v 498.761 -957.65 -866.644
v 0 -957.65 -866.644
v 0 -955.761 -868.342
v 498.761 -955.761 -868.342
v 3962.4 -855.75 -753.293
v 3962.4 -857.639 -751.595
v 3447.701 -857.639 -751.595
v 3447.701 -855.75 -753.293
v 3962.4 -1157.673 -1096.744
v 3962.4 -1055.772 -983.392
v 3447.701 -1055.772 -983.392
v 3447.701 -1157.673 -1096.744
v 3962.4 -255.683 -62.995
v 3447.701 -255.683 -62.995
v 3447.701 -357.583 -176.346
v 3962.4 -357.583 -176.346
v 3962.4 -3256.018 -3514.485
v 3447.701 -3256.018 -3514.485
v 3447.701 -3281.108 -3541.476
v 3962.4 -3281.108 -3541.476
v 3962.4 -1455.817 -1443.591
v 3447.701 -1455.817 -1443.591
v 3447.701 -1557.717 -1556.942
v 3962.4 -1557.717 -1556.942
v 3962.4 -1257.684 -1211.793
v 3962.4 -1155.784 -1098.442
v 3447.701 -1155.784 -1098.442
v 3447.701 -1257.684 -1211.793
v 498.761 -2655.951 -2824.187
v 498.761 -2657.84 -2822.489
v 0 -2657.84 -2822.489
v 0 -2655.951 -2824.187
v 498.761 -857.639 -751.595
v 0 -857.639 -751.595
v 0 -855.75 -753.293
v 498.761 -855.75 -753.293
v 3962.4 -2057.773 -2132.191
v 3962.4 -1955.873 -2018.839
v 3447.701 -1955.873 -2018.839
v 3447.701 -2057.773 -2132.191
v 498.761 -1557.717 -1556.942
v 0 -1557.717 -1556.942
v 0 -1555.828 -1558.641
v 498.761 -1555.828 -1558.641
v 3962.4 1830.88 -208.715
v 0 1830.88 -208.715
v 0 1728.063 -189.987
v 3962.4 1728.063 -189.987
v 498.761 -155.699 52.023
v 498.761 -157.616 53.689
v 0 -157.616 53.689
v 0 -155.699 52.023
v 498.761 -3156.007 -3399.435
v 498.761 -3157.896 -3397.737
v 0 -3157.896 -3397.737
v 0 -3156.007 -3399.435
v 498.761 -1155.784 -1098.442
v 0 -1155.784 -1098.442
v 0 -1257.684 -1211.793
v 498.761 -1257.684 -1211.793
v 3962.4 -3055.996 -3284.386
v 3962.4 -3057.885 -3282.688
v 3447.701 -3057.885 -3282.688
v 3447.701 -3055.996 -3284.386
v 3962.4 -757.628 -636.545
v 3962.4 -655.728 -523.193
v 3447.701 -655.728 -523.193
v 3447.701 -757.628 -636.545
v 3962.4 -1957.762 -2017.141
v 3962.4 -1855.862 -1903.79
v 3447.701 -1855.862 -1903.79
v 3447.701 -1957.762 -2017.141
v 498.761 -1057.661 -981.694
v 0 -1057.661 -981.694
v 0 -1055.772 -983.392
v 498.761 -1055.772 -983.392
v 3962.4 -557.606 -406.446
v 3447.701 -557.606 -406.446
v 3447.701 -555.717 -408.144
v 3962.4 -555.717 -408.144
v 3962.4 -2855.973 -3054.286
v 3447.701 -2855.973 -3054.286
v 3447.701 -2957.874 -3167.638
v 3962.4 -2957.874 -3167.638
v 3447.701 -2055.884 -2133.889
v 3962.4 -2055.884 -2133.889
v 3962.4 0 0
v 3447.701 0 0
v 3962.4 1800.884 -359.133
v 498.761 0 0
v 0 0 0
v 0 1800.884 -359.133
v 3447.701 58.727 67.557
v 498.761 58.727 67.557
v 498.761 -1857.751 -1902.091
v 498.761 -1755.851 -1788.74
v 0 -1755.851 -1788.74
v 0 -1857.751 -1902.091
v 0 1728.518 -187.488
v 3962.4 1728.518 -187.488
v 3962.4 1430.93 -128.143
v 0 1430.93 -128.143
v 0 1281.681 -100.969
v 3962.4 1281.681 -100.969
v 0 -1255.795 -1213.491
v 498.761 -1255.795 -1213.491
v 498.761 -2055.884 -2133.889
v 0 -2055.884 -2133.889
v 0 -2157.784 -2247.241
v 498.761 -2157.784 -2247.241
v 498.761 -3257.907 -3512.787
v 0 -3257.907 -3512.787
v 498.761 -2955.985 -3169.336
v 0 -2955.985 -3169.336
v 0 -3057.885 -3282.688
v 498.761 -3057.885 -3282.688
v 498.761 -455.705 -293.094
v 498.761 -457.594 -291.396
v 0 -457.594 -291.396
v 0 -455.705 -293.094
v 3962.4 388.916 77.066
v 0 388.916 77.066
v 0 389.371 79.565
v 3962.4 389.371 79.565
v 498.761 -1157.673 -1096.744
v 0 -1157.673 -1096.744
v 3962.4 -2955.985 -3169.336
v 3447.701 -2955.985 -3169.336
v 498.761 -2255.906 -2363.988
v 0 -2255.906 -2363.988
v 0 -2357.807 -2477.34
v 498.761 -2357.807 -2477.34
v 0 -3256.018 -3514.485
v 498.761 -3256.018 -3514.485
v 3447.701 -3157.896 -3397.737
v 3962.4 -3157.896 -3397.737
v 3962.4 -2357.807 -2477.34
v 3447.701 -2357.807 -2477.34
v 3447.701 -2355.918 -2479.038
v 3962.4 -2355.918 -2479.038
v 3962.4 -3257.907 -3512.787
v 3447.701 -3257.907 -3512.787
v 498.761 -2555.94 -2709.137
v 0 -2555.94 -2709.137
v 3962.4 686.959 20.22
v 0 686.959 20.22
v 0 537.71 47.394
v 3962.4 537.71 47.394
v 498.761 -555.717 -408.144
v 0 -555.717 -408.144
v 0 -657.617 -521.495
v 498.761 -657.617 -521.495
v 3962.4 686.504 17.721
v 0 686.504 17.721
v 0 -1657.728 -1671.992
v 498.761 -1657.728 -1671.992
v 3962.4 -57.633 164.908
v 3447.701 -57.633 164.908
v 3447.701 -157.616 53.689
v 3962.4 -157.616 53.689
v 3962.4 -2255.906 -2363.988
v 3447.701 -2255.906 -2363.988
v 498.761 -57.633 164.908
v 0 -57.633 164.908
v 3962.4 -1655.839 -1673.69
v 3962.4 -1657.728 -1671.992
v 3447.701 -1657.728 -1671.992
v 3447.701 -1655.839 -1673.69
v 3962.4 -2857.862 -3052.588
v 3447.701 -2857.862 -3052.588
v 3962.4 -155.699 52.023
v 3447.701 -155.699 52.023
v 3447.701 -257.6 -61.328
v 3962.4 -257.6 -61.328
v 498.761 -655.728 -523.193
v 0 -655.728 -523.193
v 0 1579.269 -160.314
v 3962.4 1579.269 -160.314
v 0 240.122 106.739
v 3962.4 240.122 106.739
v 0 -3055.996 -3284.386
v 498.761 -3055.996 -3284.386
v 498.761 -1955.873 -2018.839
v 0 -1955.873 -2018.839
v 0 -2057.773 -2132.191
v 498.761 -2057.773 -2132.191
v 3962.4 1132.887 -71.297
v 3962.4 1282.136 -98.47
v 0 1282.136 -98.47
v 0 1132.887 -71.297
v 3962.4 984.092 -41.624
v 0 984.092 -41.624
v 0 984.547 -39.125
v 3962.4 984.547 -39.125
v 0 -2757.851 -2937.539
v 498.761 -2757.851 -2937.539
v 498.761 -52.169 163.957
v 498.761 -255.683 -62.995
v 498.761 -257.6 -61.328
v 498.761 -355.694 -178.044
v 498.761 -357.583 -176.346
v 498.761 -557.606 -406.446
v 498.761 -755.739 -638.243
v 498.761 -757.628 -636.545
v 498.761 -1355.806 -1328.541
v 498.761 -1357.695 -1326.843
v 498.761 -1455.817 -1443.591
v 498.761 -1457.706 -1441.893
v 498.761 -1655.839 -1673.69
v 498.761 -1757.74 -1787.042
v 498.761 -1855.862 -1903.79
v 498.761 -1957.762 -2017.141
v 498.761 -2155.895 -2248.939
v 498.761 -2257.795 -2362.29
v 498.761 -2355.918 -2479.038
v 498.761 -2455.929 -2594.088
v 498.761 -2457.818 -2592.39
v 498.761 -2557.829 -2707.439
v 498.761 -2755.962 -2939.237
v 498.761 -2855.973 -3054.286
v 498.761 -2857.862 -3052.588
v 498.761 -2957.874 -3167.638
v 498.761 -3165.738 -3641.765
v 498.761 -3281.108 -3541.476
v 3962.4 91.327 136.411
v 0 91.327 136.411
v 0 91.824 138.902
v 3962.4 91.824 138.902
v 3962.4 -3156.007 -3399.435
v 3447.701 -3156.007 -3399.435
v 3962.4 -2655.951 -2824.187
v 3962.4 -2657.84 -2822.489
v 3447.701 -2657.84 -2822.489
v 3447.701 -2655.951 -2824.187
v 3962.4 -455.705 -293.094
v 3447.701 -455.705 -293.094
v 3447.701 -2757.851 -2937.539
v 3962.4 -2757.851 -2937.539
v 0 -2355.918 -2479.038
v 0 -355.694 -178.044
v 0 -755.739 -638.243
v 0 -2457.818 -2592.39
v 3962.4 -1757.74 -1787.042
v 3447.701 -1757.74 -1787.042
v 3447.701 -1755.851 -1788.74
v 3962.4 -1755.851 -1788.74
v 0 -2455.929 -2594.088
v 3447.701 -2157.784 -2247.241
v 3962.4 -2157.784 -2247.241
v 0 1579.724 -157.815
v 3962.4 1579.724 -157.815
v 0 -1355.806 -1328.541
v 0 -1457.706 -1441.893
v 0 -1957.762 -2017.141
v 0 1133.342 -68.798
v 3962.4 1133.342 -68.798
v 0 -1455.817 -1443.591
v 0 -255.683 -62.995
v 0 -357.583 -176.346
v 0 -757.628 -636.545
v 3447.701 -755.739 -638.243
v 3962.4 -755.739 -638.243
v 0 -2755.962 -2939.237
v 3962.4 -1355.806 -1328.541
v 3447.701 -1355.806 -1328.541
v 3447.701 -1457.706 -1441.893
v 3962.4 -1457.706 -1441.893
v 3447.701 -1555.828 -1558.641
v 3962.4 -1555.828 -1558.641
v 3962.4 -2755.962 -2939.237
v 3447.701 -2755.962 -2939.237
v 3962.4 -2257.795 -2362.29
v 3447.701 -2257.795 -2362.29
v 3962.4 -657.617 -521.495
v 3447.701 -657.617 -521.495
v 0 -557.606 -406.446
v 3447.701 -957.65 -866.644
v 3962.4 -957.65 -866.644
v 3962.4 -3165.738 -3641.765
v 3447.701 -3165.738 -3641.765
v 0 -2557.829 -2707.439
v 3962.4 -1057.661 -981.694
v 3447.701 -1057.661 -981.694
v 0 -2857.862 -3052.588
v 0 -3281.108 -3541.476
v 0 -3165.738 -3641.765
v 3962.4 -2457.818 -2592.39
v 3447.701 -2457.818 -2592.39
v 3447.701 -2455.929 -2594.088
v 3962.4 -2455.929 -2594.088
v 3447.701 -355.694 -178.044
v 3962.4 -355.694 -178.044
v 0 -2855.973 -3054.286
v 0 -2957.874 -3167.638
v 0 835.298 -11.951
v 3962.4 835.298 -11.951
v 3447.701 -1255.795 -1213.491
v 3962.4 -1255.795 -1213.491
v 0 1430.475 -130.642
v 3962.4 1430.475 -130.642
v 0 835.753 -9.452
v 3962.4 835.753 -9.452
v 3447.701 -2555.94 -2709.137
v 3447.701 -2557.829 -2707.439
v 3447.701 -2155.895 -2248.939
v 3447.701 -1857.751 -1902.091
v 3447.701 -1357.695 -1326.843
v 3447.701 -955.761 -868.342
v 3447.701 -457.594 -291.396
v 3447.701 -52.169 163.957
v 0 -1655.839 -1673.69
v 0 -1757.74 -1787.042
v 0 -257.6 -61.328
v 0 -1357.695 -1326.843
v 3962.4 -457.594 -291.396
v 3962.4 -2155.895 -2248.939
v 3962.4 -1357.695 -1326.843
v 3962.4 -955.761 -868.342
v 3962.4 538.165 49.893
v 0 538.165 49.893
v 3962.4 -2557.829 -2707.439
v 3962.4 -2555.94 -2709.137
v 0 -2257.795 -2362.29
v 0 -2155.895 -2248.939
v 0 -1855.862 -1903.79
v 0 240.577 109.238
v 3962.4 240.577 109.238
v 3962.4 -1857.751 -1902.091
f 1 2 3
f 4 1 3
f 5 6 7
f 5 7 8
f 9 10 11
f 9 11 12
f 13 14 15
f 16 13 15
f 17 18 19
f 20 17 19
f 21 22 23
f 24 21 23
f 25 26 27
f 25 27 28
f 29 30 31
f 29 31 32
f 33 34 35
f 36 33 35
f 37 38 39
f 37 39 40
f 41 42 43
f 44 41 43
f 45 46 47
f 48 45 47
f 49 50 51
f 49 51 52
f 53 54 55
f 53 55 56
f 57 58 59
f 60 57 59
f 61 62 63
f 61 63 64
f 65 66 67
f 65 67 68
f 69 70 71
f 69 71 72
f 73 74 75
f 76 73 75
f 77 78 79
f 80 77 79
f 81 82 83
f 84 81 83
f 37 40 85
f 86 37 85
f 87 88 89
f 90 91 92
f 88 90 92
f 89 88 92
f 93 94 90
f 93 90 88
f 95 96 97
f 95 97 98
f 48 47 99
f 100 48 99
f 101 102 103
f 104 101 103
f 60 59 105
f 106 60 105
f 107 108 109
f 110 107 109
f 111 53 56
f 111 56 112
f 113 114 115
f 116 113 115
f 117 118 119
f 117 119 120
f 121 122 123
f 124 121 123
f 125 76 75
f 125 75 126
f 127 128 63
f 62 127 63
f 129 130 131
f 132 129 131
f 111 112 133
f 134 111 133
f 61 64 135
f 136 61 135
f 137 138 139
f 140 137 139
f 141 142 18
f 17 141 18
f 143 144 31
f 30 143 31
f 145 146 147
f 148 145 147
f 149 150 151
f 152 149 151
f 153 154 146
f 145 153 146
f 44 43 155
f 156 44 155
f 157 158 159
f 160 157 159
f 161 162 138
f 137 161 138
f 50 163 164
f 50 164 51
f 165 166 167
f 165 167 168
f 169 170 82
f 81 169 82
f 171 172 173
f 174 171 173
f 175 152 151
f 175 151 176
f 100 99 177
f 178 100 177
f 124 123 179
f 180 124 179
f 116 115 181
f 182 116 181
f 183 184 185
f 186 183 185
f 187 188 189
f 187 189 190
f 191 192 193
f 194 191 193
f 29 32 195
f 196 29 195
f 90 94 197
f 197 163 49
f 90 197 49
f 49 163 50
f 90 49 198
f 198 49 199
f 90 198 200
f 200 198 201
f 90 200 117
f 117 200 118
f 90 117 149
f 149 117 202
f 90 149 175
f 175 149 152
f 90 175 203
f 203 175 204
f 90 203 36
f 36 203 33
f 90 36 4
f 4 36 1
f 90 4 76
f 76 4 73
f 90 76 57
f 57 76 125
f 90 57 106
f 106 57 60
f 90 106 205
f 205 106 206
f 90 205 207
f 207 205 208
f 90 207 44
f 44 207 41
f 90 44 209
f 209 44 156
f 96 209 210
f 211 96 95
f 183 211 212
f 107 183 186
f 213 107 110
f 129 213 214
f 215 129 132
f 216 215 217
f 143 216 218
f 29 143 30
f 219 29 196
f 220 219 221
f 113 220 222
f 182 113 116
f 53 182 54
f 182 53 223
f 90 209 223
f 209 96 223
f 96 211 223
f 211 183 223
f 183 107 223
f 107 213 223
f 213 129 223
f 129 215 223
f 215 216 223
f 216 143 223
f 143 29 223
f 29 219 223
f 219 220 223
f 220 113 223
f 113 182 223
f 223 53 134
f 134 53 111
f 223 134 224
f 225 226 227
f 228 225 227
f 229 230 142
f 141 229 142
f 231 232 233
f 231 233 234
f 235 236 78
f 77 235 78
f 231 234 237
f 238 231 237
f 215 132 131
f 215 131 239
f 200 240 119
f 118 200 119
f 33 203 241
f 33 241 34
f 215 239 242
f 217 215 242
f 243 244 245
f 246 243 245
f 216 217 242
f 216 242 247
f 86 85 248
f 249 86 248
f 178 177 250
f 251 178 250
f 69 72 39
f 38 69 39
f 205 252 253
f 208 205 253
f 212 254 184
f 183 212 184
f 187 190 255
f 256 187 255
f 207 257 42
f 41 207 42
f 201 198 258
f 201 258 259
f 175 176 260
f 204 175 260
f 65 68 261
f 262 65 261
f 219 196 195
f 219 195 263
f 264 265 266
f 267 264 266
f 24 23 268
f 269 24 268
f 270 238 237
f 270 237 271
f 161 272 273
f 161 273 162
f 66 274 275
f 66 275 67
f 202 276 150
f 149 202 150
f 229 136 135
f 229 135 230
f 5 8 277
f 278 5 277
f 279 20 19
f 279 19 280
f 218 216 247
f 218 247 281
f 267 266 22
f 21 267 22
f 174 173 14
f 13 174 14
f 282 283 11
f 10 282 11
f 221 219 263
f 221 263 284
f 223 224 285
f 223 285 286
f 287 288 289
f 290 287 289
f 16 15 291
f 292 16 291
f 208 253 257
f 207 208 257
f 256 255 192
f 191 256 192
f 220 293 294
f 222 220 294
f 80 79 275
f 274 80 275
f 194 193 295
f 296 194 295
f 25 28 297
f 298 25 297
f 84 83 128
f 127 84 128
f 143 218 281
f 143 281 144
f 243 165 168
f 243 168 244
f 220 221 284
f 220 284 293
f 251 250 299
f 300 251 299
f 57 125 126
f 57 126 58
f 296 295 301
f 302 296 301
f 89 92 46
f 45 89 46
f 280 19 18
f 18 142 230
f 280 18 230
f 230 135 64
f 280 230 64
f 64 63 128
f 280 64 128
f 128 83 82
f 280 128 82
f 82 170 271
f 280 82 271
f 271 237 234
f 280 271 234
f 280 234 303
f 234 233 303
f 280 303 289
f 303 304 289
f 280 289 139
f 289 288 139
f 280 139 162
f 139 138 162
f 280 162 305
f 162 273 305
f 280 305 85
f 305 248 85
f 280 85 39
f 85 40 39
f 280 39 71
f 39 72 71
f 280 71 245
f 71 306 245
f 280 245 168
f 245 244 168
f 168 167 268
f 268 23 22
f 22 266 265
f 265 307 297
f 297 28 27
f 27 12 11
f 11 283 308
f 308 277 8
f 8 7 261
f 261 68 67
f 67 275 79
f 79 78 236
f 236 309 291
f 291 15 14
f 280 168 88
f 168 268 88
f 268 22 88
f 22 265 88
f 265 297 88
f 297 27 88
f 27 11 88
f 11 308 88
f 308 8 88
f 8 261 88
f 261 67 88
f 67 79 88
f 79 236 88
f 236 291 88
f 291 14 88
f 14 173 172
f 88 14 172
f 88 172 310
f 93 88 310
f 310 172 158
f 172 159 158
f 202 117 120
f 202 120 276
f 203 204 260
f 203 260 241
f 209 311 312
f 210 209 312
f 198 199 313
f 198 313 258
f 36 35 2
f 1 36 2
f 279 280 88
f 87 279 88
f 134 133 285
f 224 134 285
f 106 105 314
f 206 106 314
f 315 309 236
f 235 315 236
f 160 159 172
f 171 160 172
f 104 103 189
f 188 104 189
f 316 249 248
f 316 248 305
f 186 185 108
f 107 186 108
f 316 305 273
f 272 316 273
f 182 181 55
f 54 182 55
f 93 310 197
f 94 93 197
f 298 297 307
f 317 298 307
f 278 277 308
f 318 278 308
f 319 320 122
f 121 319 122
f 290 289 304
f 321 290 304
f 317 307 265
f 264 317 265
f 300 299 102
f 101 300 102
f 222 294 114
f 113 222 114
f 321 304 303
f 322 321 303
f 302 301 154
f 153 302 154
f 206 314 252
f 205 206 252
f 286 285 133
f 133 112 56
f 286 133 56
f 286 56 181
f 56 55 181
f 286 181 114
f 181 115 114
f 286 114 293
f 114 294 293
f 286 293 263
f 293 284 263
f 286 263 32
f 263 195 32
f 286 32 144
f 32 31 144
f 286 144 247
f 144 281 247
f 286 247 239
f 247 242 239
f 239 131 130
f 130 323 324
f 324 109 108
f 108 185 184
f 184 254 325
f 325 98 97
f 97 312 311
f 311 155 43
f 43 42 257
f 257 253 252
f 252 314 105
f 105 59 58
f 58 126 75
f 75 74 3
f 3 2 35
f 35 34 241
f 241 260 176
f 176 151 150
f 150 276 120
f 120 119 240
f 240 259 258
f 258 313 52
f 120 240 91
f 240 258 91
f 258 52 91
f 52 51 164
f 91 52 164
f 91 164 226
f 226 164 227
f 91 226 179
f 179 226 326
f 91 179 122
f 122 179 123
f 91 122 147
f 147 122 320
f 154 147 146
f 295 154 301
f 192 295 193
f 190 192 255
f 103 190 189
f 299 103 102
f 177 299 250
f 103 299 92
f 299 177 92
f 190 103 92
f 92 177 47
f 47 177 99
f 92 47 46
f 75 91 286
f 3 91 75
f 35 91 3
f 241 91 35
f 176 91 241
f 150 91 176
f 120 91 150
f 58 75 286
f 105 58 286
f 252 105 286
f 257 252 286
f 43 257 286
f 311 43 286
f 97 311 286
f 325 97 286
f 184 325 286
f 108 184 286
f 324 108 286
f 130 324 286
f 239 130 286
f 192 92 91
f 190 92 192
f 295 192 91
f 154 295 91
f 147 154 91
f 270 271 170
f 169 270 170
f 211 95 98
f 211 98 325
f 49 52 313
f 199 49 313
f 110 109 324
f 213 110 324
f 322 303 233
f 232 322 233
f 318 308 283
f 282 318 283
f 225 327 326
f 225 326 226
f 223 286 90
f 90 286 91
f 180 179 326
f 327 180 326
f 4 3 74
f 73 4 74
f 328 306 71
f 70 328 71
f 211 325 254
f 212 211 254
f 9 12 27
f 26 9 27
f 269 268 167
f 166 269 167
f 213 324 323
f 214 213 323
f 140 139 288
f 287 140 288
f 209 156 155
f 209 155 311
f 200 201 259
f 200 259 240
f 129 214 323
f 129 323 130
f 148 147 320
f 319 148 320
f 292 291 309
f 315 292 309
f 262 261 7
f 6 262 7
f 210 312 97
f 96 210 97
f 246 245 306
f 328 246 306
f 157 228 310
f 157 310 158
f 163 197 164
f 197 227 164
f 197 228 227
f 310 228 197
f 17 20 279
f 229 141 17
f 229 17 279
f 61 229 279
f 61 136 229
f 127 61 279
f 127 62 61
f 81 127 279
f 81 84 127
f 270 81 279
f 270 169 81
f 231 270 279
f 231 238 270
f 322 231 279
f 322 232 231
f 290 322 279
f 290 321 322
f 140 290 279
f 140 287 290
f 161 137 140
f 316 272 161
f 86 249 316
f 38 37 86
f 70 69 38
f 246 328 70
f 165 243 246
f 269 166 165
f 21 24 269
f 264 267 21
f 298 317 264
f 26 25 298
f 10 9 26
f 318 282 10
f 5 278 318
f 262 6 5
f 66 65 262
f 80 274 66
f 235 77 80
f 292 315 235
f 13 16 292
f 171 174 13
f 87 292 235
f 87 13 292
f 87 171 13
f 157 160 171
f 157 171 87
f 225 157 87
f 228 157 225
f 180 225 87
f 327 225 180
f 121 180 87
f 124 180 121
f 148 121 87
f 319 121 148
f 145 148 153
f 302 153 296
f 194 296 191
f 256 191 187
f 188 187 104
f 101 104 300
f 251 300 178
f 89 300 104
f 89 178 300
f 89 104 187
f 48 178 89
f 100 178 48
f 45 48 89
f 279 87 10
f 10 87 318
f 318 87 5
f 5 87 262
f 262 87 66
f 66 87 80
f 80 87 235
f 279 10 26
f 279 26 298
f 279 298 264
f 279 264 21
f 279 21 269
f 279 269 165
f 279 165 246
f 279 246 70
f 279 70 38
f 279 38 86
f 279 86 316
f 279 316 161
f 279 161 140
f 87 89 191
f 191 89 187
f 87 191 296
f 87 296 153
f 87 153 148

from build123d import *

# Parameters (mm, degrees)
F1_DEPTH = 3962.4
F2_W     = 982.98
F2_H     = 4914.9
F3_DEPTH = 154.178
F5_DEPTH = 3962.4


# Not quite as in the source:
# - ends of sketch curves that miss each other by under 0.0002 mm in the source are joined


with BuildPart() as f1:
    # F0 (on Right) → F1 (new body)
    with BuildSketch(Plane.YZ):
        Polygon((-1062.7204243511, -1222.520001882), (0, 0), (1800.8836783461, -359.1330239131), (1831.0362082596, -207.9322282015), (-57.6330628745, 168.7070376599), (-3282.0975844599, -3540.615078177), (-3165.7379708004, -3641.7649471487), align=None)
    extrude(amount=F1_DEPTH)

    # F2 (on face) → F3 (cut)
    with BuildSketch(Plane(origin=(0, -116.3596136596, 101.1498689717), x_dir=(1, 0, 0), z_dir=(0, -0.7547095802, 0.656059029))):
        Polygon((1481.7409789185, -4825.3858736942), (1481.7409789185, 89.5141263058), (498.7609789185, 89.5141263058), (498.7609789185, -1548.7858736942), (498.7609789185, -3187.0858736942), (498.7609789185, -4825.3858736942), align=None)
        with Locations((1973.2309789185, -2367.9358736942)):
            Rectangle(F2_W, F2_H)
        with Locations((2956.2109789185, -2367.9358736942)):
            Rectangle(F2_W, F2_H)
    extrude(amount=-F3_DEPTH, mode=Mode.SUBTRACT)

    # F4 (on face) → F5 (cut)
    with BuildSketch(Plane(origin=(0, 0, 0), x_dir=(0, -1, 0), z_dir=(-1, 0, 0))):
        Polygon((3359.7929958838, -3626.122896465), (3257.9070493635, -3512.7870508483), (3256.0181183313, -3514.4851502014), align=None)
        Polygon((-1728.0633988919, -189.9869954259), (-1728.5183752228, -187.4880763519), (-1877.975504427, -217.2928835151), align=None)
        Polygon((157.6164588926, 53.689297634), (57.6330628745, 168.7070376599), (57.6330628745, 164.9077501103), align=None)
        Polygon((57.6330628745, 164.9077501103), (57.6330628745, 168.7070376599), (-91.8240663297, 138.9022304967), align=None)
        Polygon((257.5998549108, -61.328442392), (157.6164588926, 53.689297634), (155.6994965589, 52.0229077003), align=None)
        Polygon((357.5832509291, -176.3461824181), (257.5998549108, -61.328442392), (255.682892577, -62.9948323256), align=None)
        Polygon((457.5944201085, -291.3958718113), (357.5832509291, -176.3461824181), (355.6943240939, -178.0442858929), align=None)
        Polygon((557.6055854343, -406.4455567714), (457.5944201085, -291.3958718113), (455.7054893441, -293.0939709155), align=None)
        Polygon((657.6167507599, -521.4952417314), (557.6055854343, -406.4455567714), (555.7166546943, -408.1436558504), align=None)
        Polygon((757.6279160871, -636.5449266932), (657.6167507599, -521.4952417314), (655.7278198727, -523.1933409397), align=None)
        Polygon((857.6390814104, -751.5946116505), (757.6279160871, -636.5449266932), (755.7389850512, -638.2430260291), align=None)
        Polygon((957.6502467357, -866.64429661), (857.6390814104, -751.5946116505), (855.7501502296, -753.2927111184), align=None)
        Polygon((1057.6614120711, -981.6939815812), (957.6502467357, -866.64429661), (955.7613154081, -868.3423962077), align=None)
        Polygon((1157.6725773853, -1096.743666528), (1057.6614120711, -981.6939815812), (1055.7724803196, -983.3920815471), align=None)
        Polygon((1257.6837427263, -1211.7933515057), (1157.6725773853, -1096.743666528), (1155.7836463636, -1098.4417658929), align=None)
        Polygon((1357.694908057, -1326.8430364714), (1257.6837427263, -1211.7933515057), (1255.7948116941, -1213.4914508588), align=None)
        Polygon((1457.7060733877, -1441.8927214372), (1357.694908057, -1326.8430364714), (1355.8059770247, -1328.5411358246), align=None)
        Polygon((1557.7172387183, -1556.942406403), (1457.7060733877, -1441.8927214372), (1455.8171423554, -1443.5908207904), align=None)
        Polygon((1657.728404049, -1671.9920913688), (1557.7172387183, -1556.942406403), (1555.8283076861, -1558.6405057562), align=None)
        Polygon((1957.7619000458, -2017.1411462715), (1857.7507347135, -1902.0914613039), (1855.8618036813, -1903.7895606571), align=None)
        Polygon((1857.7507347135, -1902.0914613039), (1757.7395693813, -1787.0417763363), (1755.850638349, -1788.7398756895), align=None)
        Polygon((1757.7395693813, -1787.0417763363), (1657.728404049, -1671.9920913688), (1655.8394730168, -1673.6901907219), align=None)
        Polygon((2057.773065378, -2132.1908312391), (1957.7619000458, -2017.1411462715), (1955.8729690135, -2018.8392456247), align=None)
        Polygon((2157.7842307103, -2247.2405162067), (2057.773065378, -2132.1908312391), (2055.8841343458, -2133.8889305922), align=None)
        Polygon((2257.7953960425, -2362.2902011743), (2157.7842307103, -2247.2405162067), (2155.895299678, -2248.9386155598), align=None)
        Polygon((2357.8065613748, -2477.3398861418), (2257.7953960425, -2362.2902011743), (2255.9064650103, -2363.9883005274), align=None)
        Polygon((2457.817726707, -2592.3895711094), (2357.8065613748, -2477.3398861418), (2355.9176303426, -2479.037985495), align=None)
        Polygon((2557.8288920393, -2707.439256077), (2457.817726707, -2592.3895711094), (2455.9287956748, -2594.0876704626), align=None)
        Polygon((2657.8400573716, -2822.4889410446), (2557.8288920393, -2707.439256077), (2555.9399610071, -2709.1373554302), align=None)
        Polygon((2655.9511263393, -2824.1870403977), (2757.8512227038, -2937.5386260122), (2657.8400573716, -2822.4889410446), align=None)
        Polygon((2755.9622916716, -2939.2367253653), (2857.8623880361, -3052.5883109797), (2757.8512227038, -2937.5386260122), align=None)
        Polygon((2855.9734570038, -3054.2864103329), (2957.8735533683, -3167.6379959473), (2857.8623880361, -3052.5883109797), align=None)
        Polygon((2955.9846223361, -3169.3360953005), (3057.8847187006, -3282.6876809149), (2957.8735533683, -3167.6379959473), align=None)
        Polygon((3055.9957876683, -3284.3857802681), (3157.8958840328, -3397.7373658825), (3057.8847187006, -3282.6876809149), align=None)
        Polygon((3156.0069530006, -3399.4354652356), (3257.9070493635, -3512.7870508483), (3157.8958840328, -3397.7373658825), align=None)
        Polygon((-1579.2692161887, -160.3143933487), (-1579.7241925196, -157.8154742747), (-1728.5183752228, -187.4880763519), align=None)
        Polygon((-1430.4750334855, -130.6417912715), (-1430.9300098164, -128.1428721975), (-1579.7241925196, -157.8154742747), align=None)
        Polygon((-1281.6808507823, -100.9691891943), (-1282.1358271132, -98.4702701204), (-1430.9300098164, -128.1428721975), align=None)
        Polygon((-1132.8866680792, -71.2965871171), (-1133.34164441, -68.7976680432), (-1282.1358271132, -98.4702701204), align=None)
        Polygon((-984.092485376, -41.62398504), (-984.5474617069, -39.125065966), (-1133.34164441, -68.7976680432), align=None)
        Polygon((-835.2983026728, -11.9513829628), (-835.7532790037, -9.4524638888), (-984.5474617069, -39.125065966), align=None)
        Polygon((-686.5041199696, 17.7212191144), (-686.9590963005, 20.2201381884), (-835.7532790037, -9.4524638888), align=None)
        Polygon((-537.7099372664, 47.3938211916), (-538.1649135973, 49.8927402656), (-686.9590963005, 20.2201381884), align=None)
        Polygon((-388.9157545632, 77.0664232688), (-389.3707308958, 79.5653423425), (-538.1649135973, 49.8927402656), align=None)
        Polygon((-240.1215718796, 106.7390254439), (-240.5765423462, 109.2379455855), (-389.3707308958, 79.5653423425), align=None)
        Polygon((-91.3273195437, 136.4112783433), (-91.8240663297, 138.9022304967), (-240.5765423462, 109.2379455855), align=None)
    extrude(amount=-F5_DEPTH, mode=Mode.SUBTRACT)


solid = f1.part
